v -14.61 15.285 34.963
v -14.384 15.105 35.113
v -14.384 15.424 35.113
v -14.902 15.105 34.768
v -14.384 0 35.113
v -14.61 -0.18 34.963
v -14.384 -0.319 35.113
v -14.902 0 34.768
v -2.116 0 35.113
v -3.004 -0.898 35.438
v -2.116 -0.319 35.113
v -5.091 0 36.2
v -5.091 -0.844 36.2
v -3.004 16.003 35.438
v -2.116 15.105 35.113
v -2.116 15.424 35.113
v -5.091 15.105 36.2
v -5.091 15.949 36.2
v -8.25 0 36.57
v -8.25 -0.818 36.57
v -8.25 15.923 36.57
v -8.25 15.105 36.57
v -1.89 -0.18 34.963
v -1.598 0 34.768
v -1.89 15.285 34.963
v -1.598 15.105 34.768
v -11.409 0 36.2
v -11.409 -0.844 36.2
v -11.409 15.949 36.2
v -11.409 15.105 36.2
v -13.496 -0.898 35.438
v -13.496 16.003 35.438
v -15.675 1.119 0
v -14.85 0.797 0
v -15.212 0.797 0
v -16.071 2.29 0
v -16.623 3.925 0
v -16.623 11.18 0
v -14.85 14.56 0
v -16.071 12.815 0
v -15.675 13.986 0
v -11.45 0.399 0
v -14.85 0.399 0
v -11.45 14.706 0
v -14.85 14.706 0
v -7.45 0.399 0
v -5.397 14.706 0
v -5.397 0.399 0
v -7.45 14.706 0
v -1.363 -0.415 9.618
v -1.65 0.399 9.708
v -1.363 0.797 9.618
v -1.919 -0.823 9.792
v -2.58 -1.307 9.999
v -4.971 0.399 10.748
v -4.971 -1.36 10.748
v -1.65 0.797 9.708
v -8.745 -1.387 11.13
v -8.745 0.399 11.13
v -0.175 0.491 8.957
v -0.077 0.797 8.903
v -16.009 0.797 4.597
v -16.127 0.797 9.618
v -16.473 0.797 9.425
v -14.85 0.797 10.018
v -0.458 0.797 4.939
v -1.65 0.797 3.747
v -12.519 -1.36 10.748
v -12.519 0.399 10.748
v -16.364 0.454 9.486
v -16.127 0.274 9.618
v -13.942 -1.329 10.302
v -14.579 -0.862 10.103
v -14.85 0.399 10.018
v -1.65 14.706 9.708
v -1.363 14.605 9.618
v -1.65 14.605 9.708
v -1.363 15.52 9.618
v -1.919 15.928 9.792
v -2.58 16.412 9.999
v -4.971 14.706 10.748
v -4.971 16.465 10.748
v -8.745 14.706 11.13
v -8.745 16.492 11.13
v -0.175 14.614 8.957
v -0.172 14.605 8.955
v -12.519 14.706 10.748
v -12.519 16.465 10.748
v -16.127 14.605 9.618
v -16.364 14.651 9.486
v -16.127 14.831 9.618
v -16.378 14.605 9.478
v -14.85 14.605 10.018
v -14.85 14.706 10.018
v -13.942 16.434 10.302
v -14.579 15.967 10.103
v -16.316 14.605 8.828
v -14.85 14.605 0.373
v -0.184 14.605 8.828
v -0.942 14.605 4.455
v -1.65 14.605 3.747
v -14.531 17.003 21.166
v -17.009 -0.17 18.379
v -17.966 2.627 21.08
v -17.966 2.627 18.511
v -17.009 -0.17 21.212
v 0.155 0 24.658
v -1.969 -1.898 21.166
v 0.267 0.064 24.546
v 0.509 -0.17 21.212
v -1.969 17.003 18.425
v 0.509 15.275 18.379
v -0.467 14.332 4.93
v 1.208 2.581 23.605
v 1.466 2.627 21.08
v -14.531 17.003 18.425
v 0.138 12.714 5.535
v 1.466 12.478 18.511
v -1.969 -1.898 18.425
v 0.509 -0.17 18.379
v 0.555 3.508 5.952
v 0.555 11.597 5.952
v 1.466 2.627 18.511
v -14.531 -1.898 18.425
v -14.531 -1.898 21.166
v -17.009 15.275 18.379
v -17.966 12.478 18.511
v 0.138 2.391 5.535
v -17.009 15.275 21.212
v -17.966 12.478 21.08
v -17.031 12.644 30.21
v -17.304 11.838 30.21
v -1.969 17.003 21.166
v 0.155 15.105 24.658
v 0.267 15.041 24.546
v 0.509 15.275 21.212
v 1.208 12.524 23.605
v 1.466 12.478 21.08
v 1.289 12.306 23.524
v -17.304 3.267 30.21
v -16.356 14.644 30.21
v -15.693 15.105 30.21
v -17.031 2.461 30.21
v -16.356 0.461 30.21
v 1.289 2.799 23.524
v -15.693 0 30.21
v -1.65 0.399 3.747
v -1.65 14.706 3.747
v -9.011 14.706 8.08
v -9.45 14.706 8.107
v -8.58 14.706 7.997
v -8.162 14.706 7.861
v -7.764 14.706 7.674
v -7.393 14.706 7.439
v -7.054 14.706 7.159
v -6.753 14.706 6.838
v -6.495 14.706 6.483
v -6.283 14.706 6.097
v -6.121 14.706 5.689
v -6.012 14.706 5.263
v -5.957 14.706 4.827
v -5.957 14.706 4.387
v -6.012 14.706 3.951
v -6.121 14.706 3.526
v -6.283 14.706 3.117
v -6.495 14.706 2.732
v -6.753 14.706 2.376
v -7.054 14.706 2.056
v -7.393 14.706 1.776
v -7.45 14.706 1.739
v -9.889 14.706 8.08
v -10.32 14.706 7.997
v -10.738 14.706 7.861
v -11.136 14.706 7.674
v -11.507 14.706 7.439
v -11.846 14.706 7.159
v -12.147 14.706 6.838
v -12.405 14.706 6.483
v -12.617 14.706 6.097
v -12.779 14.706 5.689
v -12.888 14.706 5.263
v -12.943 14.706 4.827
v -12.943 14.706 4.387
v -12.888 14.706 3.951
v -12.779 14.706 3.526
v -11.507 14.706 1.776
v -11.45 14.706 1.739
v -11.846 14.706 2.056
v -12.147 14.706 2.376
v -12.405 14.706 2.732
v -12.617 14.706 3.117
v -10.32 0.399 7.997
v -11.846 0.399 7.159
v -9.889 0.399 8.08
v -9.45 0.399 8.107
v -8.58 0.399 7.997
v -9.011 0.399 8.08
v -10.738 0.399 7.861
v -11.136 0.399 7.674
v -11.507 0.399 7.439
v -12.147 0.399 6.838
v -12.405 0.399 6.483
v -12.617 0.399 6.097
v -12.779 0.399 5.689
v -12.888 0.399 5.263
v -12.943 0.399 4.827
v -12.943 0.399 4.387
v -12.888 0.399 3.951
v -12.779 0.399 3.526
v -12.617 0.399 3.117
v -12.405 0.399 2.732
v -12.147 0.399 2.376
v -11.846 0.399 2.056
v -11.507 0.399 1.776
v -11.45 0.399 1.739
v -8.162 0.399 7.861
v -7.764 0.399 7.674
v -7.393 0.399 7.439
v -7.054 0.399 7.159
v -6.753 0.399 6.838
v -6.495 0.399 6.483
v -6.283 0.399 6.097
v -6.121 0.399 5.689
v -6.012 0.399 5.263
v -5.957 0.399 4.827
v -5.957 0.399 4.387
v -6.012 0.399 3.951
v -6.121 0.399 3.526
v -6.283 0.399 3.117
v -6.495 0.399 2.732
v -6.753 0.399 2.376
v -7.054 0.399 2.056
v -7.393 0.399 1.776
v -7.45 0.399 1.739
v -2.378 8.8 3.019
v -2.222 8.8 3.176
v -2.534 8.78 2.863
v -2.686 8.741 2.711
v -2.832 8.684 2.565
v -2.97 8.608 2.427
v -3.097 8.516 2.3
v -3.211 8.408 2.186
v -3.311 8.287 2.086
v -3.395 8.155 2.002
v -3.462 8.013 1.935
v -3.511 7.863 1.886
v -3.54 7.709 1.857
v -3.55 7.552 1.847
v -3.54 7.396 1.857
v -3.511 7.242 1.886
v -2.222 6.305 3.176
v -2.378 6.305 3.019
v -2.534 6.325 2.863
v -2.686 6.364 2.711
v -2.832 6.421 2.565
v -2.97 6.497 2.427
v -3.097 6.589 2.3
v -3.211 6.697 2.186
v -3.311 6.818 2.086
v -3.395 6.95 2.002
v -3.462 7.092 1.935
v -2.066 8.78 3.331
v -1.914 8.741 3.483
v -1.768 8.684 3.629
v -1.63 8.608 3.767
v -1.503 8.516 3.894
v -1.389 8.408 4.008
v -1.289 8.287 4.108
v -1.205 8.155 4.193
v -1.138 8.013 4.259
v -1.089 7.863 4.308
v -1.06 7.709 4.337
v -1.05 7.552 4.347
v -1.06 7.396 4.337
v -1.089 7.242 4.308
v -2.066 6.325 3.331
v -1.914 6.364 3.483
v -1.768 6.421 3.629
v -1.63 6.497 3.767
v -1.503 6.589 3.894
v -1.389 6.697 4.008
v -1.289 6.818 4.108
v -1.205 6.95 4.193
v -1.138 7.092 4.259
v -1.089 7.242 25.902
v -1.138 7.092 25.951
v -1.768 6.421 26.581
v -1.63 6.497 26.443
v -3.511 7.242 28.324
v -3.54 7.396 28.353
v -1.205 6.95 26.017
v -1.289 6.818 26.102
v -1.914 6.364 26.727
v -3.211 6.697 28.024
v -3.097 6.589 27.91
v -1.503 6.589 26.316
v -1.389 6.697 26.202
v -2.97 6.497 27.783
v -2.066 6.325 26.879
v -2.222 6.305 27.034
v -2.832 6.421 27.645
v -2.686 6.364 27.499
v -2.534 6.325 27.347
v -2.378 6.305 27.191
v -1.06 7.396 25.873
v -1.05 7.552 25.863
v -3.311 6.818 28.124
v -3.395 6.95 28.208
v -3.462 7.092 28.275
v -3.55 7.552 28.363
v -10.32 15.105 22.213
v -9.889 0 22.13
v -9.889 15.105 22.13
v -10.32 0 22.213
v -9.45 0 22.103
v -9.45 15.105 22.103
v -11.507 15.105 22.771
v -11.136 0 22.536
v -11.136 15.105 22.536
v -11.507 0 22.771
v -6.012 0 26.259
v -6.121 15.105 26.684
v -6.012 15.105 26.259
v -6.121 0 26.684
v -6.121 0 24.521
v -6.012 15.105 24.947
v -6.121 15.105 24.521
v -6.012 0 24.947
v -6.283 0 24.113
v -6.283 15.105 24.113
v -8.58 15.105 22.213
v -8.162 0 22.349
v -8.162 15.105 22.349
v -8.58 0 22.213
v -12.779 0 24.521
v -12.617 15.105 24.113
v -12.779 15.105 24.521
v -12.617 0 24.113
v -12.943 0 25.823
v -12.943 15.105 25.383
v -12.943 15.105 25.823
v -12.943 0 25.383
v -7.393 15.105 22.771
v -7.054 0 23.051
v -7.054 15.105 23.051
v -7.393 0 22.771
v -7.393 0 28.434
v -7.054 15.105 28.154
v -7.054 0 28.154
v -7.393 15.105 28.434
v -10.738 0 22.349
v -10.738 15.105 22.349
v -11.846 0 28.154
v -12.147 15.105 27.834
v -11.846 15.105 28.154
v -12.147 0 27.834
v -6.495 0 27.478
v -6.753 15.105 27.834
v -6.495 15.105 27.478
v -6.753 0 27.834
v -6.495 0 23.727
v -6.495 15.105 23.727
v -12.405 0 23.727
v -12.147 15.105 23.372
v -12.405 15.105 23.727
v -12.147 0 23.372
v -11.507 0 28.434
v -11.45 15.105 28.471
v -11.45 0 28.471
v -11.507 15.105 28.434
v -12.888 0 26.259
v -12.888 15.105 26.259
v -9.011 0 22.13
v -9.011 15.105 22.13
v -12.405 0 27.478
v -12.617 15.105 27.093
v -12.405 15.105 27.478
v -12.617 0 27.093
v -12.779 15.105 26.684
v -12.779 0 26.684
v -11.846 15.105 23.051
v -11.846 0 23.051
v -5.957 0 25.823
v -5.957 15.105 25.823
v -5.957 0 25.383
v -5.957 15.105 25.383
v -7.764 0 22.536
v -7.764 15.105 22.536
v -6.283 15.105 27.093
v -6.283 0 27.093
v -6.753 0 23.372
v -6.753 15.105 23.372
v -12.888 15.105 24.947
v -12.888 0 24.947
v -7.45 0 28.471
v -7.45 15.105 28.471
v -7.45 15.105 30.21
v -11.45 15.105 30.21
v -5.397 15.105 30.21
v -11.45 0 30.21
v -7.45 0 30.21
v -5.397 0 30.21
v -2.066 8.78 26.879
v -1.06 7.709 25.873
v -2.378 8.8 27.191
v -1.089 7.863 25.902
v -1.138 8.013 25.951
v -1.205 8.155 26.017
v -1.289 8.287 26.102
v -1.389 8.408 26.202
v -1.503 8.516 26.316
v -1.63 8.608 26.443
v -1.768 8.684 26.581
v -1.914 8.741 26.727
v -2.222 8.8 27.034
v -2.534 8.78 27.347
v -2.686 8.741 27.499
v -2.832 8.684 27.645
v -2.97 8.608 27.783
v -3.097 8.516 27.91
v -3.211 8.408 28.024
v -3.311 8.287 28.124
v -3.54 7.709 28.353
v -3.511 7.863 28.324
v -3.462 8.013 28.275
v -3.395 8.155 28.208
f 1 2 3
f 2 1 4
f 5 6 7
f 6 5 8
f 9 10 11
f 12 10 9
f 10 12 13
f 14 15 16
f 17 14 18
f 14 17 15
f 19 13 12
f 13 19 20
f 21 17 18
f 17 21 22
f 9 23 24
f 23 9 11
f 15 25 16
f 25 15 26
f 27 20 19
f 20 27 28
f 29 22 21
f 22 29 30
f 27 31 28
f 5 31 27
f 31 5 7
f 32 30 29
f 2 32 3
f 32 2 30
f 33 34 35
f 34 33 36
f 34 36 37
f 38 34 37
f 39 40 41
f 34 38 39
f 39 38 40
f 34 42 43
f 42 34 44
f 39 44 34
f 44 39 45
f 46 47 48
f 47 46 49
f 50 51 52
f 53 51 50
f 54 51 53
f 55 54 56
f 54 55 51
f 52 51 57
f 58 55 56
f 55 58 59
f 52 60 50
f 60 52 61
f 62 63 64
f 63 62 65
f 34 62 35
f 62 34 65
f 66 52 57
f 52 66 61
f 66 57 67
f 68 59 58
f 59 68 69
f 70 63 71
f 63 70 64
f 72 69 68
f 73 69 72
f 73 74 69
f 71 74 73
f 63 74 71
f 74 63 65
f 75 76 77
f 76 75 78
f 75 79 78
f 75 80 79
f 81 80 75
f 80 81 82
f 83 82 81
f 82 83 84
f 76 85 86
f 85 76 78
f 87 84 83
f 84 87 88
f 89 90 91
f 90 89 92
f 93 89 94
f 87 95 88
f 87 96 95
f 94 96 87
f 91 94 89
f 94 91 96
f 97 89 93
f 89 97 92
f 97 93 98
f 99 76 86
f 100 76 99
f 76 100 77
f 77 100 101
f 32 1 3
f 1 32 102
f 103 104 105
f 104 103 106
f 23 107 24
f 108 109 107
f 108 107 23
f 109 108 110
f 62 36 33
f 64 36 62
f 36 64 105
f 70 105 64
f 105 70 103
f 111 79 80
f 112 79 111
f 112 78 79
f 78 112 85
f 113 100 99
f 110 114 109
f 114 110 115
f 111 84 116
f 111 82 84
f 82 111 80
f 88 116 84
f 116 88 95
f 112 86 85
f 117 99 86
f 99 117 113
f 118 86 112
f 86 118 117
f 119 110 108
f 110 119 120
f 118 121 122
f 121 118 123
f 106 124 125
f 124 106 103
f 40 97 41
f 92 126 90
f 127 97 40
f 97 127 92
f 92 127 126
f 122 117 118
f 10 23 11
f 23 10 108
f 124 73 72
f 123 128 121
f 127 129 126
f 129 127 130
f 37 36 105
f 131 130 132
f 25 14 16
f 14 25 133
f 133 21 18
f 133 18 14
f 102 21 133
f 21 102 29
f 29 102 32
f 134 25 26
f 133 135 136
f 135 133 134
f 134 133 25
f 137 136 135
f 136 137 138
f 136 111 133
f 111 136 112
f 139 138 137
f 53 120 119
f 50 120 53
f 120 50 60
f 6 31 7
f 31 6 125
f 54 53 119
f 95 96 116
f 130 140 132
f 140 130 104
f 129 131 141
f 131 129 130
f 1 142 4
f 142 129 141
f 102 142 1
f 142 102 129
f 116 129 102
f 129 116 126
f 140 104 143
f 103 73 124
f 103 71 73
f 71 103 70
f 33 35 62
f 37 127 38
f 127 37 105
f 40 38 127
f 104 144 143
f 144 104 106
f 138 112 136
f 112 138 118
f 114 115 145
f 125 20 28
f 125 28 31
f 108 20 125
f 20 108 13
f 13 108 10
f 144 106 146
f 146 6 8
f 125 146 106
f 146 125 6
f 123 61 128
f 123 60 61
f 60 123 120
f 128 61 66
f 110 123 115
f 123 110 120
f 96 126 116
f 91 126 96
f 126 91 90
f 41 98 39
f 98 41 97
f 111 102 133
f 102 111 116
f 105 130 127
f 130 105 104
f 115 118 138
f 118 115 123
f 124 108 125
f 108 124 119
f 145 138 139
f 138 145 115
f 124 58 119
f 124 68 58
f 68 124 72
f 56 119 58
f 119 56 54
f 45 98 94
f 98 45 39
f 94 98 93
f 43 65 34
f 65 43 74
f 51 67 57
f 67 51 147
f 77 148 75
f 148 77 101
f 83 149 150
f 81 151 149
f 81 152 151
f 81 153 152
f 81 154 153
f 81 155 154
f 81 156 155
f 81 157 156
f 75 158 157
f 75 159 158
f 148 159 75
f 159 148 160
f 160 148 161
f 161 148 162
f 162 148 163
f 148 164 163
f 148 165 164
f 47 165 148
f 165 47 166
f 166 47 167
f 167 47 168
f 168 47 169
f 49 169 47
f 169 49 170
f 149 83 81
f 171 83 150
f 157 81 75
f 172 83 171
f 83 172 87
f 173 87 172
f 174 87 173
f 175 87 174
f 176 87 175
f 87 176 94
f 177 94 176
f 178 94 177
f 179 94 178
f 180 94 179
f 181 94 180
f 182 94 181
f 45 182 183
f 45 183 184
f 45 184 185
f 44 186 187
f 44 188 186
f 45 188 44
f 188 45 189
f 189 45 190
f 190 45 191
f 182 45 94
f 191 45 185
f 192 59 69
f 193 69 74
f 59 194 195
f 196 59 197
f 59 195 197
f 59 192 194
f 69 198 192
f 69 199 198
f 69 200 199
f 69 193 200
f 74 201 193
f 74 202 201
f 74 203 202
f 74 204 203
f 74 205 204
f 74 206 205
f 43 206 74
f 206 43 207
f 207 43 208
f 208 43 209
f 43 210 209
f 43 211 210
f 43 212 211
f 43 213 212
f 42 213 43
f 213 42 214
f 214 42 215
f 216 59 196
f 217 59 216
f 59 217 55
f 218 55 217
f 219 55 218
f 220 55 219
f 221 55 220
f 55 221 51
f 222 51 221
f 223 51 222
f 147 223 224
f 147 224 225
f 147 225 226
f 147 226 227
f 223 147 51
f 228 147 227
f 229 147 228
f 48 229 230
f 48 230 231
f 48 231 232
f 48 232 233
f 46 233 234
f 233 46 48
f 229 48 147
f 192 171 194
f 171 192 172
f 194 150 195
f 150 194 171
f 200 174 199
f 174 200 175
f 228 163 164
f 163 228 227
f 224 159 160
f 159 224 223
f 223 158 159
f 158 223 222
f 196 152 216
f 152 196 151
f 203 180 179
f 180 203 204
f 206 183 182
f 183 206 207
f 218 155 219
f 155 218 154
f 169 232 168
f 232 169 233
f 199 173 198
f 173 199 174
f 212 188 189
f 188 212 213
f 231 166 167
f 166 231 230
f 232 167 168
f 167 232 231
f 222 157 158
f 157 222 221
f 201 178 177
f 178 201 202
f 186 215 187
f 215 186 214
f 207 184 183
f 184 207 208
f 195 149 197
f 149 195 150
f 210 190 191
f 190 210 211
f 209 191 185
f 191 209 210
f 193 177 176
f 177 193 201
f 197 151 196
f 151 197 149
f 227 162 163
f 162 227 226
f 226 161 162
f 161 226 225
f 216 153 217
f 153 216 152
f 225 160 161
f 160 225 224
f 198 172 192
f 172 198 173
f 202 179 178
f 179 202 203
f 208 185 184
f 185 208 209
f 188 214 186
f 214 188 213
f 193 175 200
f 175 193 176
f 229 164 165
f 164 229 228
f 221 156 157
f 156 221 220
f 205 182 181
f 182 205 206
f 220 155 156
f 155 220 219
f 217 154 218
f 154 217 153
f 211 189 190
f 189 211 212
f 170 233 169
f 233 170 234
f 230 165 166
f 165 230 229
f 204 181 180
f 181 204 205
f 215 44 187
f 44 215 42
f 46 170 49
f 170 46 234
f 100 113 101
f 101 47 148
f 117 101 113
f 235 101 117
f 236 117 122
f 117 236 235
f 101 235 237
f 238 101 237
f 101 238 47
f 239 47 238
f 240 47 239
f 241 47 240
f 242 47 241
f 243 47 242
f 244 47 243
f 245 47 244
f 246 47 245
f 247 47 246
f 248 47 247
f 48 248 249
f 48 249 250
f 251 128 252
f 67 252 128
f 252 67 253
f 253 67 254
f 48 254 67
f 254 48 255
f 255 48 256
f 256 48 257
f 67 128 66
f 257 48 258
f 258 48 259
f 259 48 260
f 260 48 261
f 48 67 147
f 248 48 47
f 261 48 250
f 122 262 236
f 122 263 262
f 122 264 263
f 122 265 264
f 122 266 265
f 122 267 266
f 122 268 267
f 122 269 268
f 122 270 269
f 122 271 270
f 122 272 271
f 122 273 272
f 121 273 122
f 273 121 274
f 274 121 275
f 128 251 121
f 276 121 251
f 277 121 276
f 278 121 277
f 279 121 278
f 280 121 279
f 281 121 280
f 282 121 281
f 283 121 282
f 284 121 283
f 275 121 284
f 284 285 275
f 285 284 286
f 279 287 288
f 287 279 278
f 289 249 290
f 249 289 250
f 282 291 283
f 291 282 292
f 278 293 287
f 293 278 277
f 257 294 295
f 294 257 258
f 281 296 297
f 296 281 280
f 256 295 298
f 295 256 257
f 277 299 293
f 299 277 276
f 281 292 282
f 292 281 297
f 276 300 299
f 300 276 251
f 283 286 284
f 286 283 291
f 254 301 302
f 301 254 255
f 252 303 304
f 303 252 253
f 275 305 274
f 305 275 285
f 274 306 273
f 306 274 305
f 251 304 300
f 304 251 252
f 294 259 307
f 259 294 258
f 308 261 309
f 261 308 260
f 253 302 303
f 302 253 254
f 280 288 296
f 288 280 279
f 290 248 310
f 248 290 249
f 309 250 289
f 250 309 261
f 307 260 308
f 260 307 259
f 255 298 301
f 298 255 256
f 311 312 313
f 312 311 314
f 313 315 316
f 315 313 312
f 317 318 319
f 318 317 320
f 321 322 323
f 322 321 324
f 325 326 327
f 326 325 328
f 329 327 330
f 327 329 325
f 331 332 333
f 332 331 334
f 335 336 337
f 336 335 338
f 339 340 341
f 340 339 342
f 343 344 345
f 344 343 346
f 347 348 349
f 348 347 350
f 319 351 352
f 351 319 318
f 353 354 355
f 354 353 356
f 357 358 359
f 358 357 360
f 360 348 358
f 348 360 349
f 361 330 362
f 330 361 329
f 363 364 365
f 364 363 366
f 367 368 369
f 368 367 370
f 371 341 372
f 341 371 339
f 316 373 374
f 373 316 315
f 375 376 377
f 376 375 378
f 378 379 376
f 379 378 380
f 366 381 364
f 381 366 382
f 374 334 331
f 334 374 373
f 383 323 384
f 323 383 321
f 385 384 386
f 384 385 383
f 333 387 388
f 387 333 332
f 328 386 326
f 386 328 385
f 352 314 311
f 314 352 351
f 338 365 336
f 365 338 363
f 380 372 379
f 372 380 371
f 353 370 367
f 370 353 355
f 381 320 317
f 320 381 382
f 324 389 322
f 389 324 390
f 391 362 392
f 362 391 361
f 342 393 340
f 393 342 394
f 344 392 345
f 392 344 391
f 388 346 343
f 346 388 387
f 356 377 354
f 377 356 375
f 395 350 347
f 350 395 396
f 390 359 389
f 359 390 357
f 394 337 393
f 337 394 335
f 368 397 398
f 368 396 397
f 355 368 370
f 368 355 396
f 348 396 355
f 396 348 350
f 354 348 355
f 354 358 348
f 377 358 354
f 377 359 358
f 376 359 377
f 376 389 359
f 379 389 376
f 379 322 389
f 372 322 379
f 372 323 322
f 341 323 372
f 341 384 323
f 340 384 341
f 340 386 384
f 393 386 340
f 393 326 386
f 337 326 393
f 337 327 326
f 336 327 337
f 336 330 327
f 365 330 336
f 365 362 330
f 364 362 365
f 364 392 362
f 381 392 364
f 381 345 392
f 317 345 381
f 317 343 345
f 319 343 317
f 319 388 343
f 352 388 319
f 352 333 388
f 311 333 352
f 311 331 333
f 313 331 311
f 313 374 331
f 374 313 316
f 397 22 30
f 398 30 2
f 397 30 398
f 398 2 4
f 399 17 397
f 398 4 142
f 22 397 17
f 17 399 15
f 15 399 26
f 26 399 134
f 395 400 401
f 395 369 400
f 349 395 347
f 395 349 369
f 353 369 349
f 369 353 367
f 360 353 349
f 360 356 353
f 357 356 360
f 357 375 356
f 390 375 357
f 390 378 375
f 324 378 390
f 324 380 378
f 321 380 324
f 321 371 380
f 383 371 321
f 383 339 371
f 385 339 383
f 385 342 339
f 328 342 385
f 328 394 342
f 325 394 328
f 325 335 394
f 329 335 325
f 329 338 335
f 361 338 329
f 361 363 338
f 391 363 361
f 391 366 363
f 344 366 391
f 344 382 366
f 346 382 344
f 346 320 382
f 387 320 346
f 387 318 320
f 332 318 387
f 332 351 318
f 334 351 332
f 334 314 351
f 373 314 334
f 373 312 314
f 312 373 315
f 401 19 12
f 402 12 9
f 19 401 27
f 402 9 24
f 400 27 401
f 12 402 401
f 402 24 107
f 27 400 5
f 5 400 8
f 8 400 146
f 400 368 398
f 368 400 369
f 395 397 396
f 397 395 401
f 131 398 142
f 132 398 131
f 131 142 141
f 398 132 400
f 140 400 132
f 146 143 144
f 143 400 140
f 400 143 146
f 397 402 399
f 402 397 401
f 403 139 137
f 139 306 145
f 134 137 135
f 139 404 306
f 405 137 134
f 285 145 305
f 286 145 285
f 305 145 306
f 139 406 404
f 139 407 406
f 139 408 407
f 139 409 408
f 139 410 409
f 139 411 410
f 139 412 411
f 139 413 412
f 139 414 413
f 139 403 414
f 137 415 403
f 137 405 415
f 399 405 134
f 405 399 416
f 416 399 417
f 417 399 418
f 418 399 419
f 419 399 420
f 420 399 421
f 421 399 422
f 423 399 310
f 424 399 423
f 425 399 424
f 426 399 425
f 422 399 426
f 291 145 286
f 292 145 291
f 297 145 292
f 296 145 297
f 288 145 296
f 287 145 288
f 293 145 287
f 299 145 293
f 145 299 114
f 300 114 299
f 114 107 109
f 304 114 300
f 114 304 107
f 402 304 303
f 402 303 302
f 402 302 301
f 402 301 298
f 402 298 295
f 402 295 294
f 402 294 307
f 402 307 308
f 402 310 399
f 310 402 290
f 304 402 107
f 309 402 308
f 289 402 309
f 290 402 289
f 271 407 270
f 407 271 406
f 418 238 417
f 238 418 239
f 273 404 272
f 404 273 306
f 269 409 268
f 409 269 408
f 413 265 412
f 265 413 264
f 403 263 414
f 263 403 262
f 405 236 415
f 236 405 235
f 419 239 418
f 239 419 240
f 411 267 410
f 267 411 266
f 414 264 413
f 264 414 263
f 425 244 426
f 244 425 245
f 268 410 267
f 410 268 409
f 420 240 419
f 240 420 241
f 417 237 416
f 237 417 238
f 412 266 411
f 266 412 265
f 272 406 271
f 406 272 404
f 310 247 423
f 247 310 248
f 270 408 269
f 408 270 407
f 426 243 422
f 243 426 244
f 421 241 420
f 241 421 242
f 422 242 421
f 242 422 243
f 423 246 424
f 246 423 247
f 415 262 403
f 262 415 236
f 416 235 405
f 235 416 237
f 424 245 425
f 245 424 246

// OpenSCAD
// file: finger_mid.scad
include <../config.scad>
use <finger_base.scad>

rotate([0,-90,0]) fingermid();

//	Middle segment of finger, can be lengthened
module fingermid(length=19, proximalHole=true, distalHole=true)
{
	difference() {
		scale([yScaleFactor,xScaleFactor,zScaleFactor]) {
			fingerbasesolid(length);
		}
		if(proximalHole) {
			translate([0,knucklePadding/2 * xScaleFactor,0]) fingerhardwarecutouts(jointDia, jointThick, knuckleW=knuckleW-knucklePadding, fingerLen=length);
		}
		if(distalHole) {
			translate([length * yScaleFactor,0,0]) mirror([1,0,0]) fingerhardwarecutouts(jointDia, jointThick, knuckleW=knuckleW, fingerLen=length);
		}
	}
}
// file: finger_base.scad
include <../config.scad>

//rotate([0,-90,0]) fingerbase();

/**
 * Proximal phalanx for all digits (fingers and thumb) - rendered from parts/finger_base.scad
 * @id finger_base
 * @name Finger Base
 * @category Printed
 */

//	Base segment of finger, can be lengthened
module fingerbase(length=23, proximalHole=true, distalHole=true)
{
	difference() {
		scale([yScaleFactor,xScaleFactor,zScaleFactor]) {
			fingerbasesolid(length);
		}
		if(proximalHole) {
			translate([0,knucklePadding/2 * xScaleFactor,0]) fingerhardwarecutouts(jointDia, jointThick, knuckleW=knuckleW-knucklePadding, fingerLen=length);
		}
		if (distalHole) {
			translate([length * yScaleFactor,0,0]) mirror([1,0,0]) fingerhardwarecutouts(jointDia, jointThick, knuckleW=knuckleW, fingerLen=length);
		}
	}


	
}

module fingerhardwarecutouts(jointDia,jointThick,knuckleW,fingerLen,holeCutoff=100) {
	//slot for flex joint
	translate([7 - (15/jointDia),0,6*zScaleFactor - (1.8/jointThick)]) {
		rotate([90,0,0]) translate([-0.25,0,-knuckleW*xScaleFactor]) cylinder(d=jointDia, h=knuckleW*xScaleFactor, $fn=50);
		translate([-25,(knuckleW*xScaleFactor) / 2,0]) cube([50,knuckleW*xScaleFactor,jointThick], center=true);
	}
	//cubic parts
	translate([-100,0,0]) cube([100,knuckleW*xScaleFactor,100]);
	translate([-5.5*yScaleFactor,0,0]) rotate([0,45,0]) translate([-50,0,0]) cube([100,knuckleW * xScaleFactor, 10]);

	//channel for string/tendon
	translate([-fingerLen/2 * yScaleFactor, knuckleW/2 * xScaleFactor, 2.3]) rotate([0,90,0]) cylinder(d=2.5, h=holeCutoff, $fn=50);
}

//	base segment of finger, solid
module fingerbasesolid(length=50, cutout=true) {
	difference() {
		//cubic part
		translate([0,0.001 + knucklePadding/2,1]) cube([length, knuckleW - knucklePadding - 0.002, 8]);
	}
	
	//cylindrical-ish part around finger
	intersection() {
		//overly large shape to get the cross section in the XZ plane from
		difference() {
			union() {
				translate([length-4,-5,5]) rotate([-90,0,0]) cylinder(r=8,h=knuckleW + 10);
				translate([0,-5,-5]) cube([length,knuckleW + 10,20]);
			}
			//cutout for the side "guards" of the previous knuckle
			if(cutout) {
				translate([-4,-knuckleW+0.001,5.3]) rotate([-90,0,0]) cylinder(r=11,h=10);
				translate([-4,knuckleW - knucklePadding*(1/xScaleFactor),5.3]) rotate([-90,0,0]) cylinder(r=11,h=10);
			}
		}

		hull() {
			for(i=[-1,1], j=[-1,1]) {
				//angled cylinders to provide the outer shape of the finger
				translate([length/10,i*2.4 + knuckleW/2,j*2.2 + 5]) rotate([i*j*-4,j*86,0]) cylinder(d=6,h=20,center=true);
				translate([length+4, i*2.4 + knuckleW/2, j*2.2 + 5]) rotate([i*j*-4,j*-86,0]) cylinder(d=6,h=20,center=true);
			}
		}
	}
}
// file: ../config.scad
/**
 * Configuration settings for Flexy Beast, required to generate correctly sized STLs of the printed parts. See the Configuration File Assembly instructions to set this up.
 * @id config_file
 * @name Configuration File
 * @category Prerequisites!
 * @step Open config.scad in your favorite text editor.
 * @step As per the normal Cyborg Beast instructions, measure the width of the knuckles in the non-affected hand and convert to millimeters.
 * @step Add 5 to that result and then divide by 55.
 * @step Replace the x-, y-, and zScaleFactor variables in config.scad with that number.
 * @step If desired, adjust the proportions of the hand by changing those variables individually. xScaleFactor controls the width of the hand, yScaleFactor controls the length, and zScaleFactor controls the height.
 * @step Open assembly.scad in OpenSCAD to check that the flexy joint holes are not too large for the hand (should only be necessary for small children). If necessary, reduce the jointDia and jointThick variables. jointDia=5 and jointThick=2 is a good amount for smaller hands.
 * @step Set the fingerPads variable to true or false depending on whether you want to cast silicone finger pads for improved grip.
 * @step Open palm.scad, finger_base.scad, finger_tip.scad, and thumb_tip.scad in OpenSCAD, render each part (F6), and export as STL, then print. Suggested print settings are 0.2mm or smaller layer height, 3 perimeters, and 25% rectilinear or hexagonal infill.
 */

knuckleR = 4.85;
knucklePadding = 0.5;
knuckleW = 9.5;
wristH = 10;
palmH = 20;
palmW = 64;
th = 3;
fn = 32;

//flexy joint parameters
jointDia = 7;
jointThick = 4;

//finger pad settings
fingerPads = true; //whether or not to hollow the finger tips slightly for molding pads

//desired scale factor for hand based on the standard Cyborg Beast/Robohand sizing guide
xScaleFactor = 1.59; // [1.05:1.60]
yScaleFactor = 1.59; // [1.05:1.60]
zScaleFactor = 1.65; // [1.05:1.60]
// main file
include <../config.scad>
include <finger_base.scad>
include <finger_mid.scad>

//rotate([0,-90,0]) fingertip_curved_solid(pad=fingerPads);

/**
 * Distal phalanx of fingers - rendered from parts/finger_tip.scad
 * @id finger_tip
 * @name Finger Tip
 * @category Printed
 */

module fingertip_curved_solid(length=17, pad=true, hole=true) {
//	if (!pad)
//		fingertip(length=length);
//	else {
		render() difference() {
			union() {
				fingermid(length=length+3, proximalHole=true, distalHole=false);
				translate([length*yScaleFactor,0,1.5*zScaleFactor]) rotate([0,30,0]) fingertip(length=length, proximalHole=false, cutout=false);
			}
			//hole for string
			if(hole) translate([0,xScaleFactor * knuckleW/2,2]) rotate([0,90,0]) cylinder(d=2.5,h=100, $fn=50);
			//hollow for soft pad
			if(pad) translate([length*yScaleFactor,0,1.5*zScaleFactor]) rotate([0,30,0]) fingertip_pad(length);
		}
//	}
}

module fingertip_solid(length=15, pad=true) {
	if (!pad)
		fingertip(length=length);
	else {
		render() difference() {
			fingertip(length=length);
			if(pad) fingertip_pad(length);
		}
	}
}

module fingertip_pad(length) {
	difference() {
		fingertip(length,pad=false, proximalHole=false, cutout=false);
		translate([0,-10,-10]) cube([length-7,50,50]);
		translate([0,0.2*xScaleFactor,4.5]) cube([length+5,xScaleFactor * (knuckleW - knucklePadding),8]);
		translate([0,xScaleFactor * knuckleW/2,0]) {
			rotate([0,60,0]) cylinder(d=8, h=100);
		}
	}
}

//	tip segment of finger, can be lengthened
module fingertip(length=15, proximalHole=true, cutout=true)
{
	intersection() {
		difference() {
			scale([yScaleFactor,xScaleFactor,zScaleFactor]) {
				fingerbasesolid(length,cutout);
			}
			if(proximalHole) {
				translate([0,knucklePadding/2 * xScaleFactor,0]) fingerhardwarecutouts(jointDia, jointThick, knuckleW=knuckleW-knucklePadding, fingerLen=length, holeCutoff=(length-0.5)*2);
				translate([(length - 5) * yScaleFactor,(knuckleW/2) * xScaleFactor,0])
					rotate([0,30,0]) translate([0,0,2]) cylinder(d=2.5, h=100, $fn=50);
			}
		}
		translate([(length-10)*xScaleFactor,0,21*zScaleFactor]) rotate([-90,0,0]) cylinder(d=70, h=100, center=true);
	}
}
